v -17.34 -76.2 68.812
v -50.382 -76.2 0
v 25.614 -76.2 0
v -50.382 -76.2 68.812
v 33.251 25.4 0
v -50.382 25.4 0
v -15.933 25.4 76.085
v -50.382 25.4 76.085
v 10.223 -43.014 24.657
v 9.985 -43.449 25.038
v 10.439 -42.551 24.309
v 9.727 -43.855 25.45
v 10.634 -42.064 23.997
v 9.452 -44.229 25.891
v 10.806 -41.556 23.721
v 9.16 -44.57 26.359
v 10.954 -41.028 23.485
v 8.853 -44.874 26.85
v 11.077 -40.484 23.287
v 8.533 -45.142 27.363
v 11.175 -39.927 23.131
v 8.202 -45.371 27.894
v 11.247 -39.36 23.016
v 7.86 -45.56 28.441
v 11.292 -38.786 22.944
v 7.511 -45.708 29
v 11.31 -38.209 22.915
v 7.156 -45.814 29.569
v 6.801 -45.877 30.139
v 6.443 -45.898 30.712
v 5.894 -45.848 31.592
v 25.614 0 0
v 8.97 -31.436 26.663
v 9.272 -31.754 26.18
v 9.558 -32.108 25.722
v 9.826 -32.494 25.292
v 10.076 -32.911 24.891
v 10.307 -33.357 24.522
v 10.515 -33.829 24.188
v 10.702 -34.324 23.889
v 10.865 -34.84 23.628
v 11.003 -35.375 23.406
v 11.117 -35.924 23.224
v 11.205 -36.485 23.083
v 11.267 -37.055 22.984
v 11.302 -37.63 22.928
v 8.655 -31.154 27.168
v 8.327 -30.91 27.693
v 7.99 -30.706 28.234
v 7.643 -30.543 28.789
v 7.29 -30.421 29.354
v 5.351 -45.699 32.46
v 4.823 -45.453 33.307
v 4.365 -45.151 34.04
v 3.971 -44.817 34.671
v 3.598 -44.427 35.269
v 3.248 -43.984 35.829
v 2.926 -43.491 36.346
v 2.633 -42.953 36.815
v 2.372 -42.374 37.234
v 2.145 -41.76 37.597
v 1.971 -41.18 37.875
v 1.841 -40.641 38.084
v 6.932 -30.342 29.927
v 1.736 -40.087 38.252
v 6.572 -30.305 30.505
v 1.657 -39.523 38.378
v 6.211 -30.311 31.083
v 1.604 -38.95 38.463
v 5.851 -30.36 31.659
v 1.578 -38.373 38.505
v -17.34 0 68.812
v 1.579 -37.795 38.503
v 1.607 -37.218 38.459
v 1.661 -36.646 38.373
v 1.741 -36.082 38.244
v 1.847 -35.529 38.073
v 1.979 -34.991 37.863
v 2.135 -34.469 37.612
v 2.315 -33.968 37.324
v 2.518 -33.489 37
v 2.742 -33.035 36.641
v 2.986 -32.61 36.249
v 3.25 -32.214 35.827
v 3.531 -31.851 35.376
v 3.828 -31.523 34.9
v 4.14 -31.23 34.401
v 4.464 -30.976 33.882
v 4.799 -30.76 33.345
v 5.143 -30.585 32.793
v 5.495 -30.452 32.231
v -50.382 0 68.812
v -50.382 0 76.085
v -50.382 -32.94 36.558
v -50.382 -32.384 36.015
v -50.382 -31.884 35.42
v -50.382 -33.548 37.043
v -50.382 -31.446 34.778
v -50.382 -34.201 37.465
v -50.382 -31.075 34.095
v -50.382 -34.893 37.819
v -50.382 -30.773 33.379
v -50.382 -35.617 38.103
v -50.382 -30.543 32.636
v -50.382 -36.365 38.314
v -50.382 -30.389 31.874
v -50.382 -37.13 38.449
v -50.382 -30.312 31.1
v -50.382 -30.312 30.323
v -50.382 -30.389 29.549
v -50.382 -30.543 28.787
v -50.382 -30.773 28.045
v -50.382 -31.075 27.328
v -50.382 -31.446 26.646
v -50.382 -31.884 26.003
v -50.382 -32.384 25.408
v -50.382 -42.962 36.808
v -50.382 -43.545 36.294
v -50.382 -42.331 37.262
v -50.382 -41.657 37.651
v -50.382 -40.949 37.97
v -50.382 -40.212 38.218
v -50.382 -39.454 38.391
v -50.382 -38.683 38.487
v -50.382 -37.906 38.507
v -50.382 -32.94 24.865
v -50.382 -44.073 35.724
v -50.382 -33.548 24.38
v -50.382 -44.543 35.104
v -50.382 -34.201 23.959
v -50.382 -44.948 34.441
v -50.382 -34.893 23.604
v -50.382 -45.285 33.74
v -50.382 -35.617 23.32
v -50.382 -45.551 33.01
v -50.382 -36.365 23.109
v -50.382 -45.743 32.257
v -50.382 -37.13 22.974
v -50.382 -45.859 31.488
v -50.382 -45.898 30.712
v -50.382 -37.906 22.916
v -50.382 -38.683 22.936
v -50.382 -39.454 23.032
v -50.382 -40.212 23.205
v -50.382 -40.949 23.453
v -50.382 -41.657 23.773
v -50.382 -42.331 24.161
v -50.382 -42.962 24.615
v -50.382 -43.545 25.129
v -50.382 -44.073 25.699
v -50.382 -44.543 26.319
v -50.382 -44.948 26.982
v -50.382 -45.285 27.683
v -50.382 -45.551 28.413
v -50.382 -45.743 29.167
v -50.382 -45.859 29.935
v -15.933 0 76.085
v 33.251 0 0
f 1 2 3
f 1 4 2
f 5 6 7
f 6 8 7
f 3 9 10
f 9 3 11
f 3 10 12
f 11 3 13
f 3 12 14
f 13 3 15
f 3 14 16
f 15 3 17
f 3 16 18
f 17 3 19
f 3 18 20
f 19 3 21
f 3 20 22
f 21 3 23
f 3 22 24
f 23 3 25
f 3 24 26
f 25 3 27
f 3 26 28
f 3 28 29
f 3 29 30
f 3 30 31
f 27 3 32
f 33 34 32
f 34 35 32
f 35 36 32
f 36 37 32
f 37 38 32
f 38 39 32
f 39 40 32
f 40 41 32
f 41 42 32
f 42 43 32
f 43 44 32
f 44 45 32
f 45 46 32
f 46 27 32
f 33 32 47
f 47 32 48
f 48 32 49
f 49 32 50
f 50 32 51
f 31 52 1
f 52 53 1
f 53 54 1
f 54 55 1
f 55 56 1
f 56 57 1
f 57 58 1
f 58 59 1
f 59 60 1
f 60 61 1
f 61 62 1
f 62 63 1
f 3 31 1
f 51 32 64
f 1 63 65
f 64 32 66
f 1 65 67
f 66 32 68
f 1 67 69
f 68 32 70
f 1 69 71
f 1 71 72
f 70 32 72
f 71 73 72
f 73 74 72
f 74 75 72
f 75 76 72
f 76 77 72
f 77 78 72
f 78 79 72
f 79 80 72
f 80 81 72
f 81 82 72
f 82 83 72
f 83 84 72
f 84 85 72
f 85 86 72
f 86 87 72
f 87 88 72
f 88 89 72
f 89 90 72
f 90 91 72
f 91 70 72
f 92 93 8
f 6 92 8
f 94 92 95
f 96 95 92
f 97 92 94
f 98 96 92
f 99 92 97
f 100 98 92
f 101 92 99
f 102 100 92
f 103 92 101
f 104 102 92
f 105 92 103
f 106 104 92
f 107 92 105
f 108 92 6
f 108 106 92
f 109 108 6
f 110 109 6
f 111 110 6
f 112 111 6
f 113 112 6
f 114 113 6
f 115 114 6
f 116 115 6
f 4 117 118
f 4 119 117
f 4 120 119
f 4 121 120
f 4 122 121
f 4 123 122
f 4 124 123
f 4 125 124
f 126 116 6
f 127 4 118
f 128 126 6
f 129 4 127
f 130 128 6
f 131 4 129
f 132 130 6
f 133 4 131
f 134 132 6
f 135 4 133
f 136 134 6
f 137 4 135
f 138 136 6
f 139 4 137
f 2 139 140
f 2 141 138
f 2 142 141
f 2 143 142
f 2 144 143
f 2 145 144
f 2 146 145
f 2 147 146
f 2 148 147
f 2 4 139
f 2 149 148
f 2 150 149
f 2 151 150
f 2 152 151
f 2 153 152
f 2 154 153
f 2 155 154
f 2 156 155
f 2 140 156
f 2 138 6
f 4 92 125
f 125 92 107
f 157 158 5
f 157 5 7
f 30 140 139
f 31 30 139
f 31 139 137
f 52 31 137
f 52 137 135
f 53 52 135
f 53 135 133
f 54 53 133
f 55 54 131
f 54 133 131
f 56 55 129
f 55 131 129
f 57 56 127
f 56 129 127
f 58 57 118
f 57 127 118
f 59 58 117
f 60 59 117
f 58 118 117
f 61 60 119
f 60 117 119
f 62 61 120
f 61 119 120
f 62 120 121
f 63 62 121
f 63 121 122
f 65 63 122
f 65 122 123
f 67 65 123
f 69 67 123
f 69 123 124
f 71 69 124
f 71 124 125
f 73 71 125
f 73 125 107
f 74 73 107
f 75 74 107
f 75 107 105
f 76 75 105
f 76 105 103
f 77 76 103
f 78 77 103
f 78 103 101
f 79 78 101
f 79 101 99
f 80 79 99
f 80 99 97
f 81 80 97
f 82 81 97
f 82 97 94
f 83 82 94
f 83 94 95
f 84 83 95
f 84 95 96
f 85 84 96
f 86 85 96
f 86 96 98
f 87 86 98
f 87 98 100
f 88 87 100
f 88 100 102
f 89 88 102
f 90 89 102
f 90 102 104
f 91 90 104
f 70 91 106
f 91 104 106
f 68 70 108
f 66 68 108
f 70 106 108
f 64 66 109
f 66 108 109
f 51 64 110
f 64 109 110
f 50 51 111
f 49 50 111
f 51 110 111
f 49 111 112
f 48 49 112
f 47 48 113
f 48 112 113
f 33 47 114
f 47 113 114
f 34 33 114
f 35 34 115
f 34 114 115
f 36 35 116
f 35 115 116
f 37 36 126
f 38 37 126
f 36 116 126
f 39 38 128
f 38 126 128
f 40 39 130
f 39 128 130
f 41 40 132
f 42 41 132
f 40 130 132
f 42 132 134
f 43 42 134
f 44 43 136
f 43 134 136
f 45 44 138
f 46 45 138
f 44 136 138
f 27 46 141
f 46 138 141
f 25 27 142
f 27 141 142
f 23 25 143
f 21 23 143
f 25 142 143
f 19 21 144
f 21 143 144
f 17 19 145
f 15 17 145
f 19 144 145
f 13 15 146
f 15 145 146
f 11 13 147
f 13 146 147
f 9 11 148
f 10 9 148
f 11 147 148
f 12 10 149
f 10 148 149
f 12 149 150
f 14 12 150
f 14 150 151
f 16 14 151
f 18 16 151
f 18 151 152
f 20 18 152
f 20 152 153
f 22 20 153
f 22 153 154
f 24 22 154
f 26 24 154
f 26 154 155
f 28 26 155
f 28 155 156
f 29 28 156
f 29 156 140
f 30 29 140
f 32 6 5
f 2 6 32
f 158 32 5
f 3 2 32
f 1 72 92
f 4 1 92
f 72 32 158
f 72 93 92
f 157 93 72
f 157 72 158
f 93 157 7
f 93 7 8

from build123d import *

# Parameters (mm, degrees)
F1_DEPTH = 76.2
F3_DEPTH = 25.4
F4_R     = 7.797698
F5_DEPTH = 127


with BuildPart() as f1:
    # F0 (on Front) → F1 (new body)
    with BuildSketch(Plane.XZ):
        Polygon((-50.381906, 0), (0, 0), (25.614025, 0), (-17.3402, 68.811595), (-50.381906, 68.811595), align=None)
    extrude(amount=F1_DEPTH)

    # F2 (on Front) → F3 (join)
    with BuildSketch(Plane.XZ):
        Polygon((-50.381906, 68.811595), (-50.381906, 0), (33.250909, 0), (-15.932729, 76.084539), (-50.381906, 76.084539), align=None)
    extrude(amount=-F3_DEPTH)

    # F4 (on face) → F5 (cut)
    with BuildSketch(Plane(origin=(-50.381906, 0, 0), x_dir=(0, -1, 0), z_dir=(-1, 0, 0))):
        with Locations((38.1, 30.711595)):
            Circle(F4_R)
    extrude(amount=-F5_DEPTH, mode=Mode.SUBTRACT)


solid = f1.part
